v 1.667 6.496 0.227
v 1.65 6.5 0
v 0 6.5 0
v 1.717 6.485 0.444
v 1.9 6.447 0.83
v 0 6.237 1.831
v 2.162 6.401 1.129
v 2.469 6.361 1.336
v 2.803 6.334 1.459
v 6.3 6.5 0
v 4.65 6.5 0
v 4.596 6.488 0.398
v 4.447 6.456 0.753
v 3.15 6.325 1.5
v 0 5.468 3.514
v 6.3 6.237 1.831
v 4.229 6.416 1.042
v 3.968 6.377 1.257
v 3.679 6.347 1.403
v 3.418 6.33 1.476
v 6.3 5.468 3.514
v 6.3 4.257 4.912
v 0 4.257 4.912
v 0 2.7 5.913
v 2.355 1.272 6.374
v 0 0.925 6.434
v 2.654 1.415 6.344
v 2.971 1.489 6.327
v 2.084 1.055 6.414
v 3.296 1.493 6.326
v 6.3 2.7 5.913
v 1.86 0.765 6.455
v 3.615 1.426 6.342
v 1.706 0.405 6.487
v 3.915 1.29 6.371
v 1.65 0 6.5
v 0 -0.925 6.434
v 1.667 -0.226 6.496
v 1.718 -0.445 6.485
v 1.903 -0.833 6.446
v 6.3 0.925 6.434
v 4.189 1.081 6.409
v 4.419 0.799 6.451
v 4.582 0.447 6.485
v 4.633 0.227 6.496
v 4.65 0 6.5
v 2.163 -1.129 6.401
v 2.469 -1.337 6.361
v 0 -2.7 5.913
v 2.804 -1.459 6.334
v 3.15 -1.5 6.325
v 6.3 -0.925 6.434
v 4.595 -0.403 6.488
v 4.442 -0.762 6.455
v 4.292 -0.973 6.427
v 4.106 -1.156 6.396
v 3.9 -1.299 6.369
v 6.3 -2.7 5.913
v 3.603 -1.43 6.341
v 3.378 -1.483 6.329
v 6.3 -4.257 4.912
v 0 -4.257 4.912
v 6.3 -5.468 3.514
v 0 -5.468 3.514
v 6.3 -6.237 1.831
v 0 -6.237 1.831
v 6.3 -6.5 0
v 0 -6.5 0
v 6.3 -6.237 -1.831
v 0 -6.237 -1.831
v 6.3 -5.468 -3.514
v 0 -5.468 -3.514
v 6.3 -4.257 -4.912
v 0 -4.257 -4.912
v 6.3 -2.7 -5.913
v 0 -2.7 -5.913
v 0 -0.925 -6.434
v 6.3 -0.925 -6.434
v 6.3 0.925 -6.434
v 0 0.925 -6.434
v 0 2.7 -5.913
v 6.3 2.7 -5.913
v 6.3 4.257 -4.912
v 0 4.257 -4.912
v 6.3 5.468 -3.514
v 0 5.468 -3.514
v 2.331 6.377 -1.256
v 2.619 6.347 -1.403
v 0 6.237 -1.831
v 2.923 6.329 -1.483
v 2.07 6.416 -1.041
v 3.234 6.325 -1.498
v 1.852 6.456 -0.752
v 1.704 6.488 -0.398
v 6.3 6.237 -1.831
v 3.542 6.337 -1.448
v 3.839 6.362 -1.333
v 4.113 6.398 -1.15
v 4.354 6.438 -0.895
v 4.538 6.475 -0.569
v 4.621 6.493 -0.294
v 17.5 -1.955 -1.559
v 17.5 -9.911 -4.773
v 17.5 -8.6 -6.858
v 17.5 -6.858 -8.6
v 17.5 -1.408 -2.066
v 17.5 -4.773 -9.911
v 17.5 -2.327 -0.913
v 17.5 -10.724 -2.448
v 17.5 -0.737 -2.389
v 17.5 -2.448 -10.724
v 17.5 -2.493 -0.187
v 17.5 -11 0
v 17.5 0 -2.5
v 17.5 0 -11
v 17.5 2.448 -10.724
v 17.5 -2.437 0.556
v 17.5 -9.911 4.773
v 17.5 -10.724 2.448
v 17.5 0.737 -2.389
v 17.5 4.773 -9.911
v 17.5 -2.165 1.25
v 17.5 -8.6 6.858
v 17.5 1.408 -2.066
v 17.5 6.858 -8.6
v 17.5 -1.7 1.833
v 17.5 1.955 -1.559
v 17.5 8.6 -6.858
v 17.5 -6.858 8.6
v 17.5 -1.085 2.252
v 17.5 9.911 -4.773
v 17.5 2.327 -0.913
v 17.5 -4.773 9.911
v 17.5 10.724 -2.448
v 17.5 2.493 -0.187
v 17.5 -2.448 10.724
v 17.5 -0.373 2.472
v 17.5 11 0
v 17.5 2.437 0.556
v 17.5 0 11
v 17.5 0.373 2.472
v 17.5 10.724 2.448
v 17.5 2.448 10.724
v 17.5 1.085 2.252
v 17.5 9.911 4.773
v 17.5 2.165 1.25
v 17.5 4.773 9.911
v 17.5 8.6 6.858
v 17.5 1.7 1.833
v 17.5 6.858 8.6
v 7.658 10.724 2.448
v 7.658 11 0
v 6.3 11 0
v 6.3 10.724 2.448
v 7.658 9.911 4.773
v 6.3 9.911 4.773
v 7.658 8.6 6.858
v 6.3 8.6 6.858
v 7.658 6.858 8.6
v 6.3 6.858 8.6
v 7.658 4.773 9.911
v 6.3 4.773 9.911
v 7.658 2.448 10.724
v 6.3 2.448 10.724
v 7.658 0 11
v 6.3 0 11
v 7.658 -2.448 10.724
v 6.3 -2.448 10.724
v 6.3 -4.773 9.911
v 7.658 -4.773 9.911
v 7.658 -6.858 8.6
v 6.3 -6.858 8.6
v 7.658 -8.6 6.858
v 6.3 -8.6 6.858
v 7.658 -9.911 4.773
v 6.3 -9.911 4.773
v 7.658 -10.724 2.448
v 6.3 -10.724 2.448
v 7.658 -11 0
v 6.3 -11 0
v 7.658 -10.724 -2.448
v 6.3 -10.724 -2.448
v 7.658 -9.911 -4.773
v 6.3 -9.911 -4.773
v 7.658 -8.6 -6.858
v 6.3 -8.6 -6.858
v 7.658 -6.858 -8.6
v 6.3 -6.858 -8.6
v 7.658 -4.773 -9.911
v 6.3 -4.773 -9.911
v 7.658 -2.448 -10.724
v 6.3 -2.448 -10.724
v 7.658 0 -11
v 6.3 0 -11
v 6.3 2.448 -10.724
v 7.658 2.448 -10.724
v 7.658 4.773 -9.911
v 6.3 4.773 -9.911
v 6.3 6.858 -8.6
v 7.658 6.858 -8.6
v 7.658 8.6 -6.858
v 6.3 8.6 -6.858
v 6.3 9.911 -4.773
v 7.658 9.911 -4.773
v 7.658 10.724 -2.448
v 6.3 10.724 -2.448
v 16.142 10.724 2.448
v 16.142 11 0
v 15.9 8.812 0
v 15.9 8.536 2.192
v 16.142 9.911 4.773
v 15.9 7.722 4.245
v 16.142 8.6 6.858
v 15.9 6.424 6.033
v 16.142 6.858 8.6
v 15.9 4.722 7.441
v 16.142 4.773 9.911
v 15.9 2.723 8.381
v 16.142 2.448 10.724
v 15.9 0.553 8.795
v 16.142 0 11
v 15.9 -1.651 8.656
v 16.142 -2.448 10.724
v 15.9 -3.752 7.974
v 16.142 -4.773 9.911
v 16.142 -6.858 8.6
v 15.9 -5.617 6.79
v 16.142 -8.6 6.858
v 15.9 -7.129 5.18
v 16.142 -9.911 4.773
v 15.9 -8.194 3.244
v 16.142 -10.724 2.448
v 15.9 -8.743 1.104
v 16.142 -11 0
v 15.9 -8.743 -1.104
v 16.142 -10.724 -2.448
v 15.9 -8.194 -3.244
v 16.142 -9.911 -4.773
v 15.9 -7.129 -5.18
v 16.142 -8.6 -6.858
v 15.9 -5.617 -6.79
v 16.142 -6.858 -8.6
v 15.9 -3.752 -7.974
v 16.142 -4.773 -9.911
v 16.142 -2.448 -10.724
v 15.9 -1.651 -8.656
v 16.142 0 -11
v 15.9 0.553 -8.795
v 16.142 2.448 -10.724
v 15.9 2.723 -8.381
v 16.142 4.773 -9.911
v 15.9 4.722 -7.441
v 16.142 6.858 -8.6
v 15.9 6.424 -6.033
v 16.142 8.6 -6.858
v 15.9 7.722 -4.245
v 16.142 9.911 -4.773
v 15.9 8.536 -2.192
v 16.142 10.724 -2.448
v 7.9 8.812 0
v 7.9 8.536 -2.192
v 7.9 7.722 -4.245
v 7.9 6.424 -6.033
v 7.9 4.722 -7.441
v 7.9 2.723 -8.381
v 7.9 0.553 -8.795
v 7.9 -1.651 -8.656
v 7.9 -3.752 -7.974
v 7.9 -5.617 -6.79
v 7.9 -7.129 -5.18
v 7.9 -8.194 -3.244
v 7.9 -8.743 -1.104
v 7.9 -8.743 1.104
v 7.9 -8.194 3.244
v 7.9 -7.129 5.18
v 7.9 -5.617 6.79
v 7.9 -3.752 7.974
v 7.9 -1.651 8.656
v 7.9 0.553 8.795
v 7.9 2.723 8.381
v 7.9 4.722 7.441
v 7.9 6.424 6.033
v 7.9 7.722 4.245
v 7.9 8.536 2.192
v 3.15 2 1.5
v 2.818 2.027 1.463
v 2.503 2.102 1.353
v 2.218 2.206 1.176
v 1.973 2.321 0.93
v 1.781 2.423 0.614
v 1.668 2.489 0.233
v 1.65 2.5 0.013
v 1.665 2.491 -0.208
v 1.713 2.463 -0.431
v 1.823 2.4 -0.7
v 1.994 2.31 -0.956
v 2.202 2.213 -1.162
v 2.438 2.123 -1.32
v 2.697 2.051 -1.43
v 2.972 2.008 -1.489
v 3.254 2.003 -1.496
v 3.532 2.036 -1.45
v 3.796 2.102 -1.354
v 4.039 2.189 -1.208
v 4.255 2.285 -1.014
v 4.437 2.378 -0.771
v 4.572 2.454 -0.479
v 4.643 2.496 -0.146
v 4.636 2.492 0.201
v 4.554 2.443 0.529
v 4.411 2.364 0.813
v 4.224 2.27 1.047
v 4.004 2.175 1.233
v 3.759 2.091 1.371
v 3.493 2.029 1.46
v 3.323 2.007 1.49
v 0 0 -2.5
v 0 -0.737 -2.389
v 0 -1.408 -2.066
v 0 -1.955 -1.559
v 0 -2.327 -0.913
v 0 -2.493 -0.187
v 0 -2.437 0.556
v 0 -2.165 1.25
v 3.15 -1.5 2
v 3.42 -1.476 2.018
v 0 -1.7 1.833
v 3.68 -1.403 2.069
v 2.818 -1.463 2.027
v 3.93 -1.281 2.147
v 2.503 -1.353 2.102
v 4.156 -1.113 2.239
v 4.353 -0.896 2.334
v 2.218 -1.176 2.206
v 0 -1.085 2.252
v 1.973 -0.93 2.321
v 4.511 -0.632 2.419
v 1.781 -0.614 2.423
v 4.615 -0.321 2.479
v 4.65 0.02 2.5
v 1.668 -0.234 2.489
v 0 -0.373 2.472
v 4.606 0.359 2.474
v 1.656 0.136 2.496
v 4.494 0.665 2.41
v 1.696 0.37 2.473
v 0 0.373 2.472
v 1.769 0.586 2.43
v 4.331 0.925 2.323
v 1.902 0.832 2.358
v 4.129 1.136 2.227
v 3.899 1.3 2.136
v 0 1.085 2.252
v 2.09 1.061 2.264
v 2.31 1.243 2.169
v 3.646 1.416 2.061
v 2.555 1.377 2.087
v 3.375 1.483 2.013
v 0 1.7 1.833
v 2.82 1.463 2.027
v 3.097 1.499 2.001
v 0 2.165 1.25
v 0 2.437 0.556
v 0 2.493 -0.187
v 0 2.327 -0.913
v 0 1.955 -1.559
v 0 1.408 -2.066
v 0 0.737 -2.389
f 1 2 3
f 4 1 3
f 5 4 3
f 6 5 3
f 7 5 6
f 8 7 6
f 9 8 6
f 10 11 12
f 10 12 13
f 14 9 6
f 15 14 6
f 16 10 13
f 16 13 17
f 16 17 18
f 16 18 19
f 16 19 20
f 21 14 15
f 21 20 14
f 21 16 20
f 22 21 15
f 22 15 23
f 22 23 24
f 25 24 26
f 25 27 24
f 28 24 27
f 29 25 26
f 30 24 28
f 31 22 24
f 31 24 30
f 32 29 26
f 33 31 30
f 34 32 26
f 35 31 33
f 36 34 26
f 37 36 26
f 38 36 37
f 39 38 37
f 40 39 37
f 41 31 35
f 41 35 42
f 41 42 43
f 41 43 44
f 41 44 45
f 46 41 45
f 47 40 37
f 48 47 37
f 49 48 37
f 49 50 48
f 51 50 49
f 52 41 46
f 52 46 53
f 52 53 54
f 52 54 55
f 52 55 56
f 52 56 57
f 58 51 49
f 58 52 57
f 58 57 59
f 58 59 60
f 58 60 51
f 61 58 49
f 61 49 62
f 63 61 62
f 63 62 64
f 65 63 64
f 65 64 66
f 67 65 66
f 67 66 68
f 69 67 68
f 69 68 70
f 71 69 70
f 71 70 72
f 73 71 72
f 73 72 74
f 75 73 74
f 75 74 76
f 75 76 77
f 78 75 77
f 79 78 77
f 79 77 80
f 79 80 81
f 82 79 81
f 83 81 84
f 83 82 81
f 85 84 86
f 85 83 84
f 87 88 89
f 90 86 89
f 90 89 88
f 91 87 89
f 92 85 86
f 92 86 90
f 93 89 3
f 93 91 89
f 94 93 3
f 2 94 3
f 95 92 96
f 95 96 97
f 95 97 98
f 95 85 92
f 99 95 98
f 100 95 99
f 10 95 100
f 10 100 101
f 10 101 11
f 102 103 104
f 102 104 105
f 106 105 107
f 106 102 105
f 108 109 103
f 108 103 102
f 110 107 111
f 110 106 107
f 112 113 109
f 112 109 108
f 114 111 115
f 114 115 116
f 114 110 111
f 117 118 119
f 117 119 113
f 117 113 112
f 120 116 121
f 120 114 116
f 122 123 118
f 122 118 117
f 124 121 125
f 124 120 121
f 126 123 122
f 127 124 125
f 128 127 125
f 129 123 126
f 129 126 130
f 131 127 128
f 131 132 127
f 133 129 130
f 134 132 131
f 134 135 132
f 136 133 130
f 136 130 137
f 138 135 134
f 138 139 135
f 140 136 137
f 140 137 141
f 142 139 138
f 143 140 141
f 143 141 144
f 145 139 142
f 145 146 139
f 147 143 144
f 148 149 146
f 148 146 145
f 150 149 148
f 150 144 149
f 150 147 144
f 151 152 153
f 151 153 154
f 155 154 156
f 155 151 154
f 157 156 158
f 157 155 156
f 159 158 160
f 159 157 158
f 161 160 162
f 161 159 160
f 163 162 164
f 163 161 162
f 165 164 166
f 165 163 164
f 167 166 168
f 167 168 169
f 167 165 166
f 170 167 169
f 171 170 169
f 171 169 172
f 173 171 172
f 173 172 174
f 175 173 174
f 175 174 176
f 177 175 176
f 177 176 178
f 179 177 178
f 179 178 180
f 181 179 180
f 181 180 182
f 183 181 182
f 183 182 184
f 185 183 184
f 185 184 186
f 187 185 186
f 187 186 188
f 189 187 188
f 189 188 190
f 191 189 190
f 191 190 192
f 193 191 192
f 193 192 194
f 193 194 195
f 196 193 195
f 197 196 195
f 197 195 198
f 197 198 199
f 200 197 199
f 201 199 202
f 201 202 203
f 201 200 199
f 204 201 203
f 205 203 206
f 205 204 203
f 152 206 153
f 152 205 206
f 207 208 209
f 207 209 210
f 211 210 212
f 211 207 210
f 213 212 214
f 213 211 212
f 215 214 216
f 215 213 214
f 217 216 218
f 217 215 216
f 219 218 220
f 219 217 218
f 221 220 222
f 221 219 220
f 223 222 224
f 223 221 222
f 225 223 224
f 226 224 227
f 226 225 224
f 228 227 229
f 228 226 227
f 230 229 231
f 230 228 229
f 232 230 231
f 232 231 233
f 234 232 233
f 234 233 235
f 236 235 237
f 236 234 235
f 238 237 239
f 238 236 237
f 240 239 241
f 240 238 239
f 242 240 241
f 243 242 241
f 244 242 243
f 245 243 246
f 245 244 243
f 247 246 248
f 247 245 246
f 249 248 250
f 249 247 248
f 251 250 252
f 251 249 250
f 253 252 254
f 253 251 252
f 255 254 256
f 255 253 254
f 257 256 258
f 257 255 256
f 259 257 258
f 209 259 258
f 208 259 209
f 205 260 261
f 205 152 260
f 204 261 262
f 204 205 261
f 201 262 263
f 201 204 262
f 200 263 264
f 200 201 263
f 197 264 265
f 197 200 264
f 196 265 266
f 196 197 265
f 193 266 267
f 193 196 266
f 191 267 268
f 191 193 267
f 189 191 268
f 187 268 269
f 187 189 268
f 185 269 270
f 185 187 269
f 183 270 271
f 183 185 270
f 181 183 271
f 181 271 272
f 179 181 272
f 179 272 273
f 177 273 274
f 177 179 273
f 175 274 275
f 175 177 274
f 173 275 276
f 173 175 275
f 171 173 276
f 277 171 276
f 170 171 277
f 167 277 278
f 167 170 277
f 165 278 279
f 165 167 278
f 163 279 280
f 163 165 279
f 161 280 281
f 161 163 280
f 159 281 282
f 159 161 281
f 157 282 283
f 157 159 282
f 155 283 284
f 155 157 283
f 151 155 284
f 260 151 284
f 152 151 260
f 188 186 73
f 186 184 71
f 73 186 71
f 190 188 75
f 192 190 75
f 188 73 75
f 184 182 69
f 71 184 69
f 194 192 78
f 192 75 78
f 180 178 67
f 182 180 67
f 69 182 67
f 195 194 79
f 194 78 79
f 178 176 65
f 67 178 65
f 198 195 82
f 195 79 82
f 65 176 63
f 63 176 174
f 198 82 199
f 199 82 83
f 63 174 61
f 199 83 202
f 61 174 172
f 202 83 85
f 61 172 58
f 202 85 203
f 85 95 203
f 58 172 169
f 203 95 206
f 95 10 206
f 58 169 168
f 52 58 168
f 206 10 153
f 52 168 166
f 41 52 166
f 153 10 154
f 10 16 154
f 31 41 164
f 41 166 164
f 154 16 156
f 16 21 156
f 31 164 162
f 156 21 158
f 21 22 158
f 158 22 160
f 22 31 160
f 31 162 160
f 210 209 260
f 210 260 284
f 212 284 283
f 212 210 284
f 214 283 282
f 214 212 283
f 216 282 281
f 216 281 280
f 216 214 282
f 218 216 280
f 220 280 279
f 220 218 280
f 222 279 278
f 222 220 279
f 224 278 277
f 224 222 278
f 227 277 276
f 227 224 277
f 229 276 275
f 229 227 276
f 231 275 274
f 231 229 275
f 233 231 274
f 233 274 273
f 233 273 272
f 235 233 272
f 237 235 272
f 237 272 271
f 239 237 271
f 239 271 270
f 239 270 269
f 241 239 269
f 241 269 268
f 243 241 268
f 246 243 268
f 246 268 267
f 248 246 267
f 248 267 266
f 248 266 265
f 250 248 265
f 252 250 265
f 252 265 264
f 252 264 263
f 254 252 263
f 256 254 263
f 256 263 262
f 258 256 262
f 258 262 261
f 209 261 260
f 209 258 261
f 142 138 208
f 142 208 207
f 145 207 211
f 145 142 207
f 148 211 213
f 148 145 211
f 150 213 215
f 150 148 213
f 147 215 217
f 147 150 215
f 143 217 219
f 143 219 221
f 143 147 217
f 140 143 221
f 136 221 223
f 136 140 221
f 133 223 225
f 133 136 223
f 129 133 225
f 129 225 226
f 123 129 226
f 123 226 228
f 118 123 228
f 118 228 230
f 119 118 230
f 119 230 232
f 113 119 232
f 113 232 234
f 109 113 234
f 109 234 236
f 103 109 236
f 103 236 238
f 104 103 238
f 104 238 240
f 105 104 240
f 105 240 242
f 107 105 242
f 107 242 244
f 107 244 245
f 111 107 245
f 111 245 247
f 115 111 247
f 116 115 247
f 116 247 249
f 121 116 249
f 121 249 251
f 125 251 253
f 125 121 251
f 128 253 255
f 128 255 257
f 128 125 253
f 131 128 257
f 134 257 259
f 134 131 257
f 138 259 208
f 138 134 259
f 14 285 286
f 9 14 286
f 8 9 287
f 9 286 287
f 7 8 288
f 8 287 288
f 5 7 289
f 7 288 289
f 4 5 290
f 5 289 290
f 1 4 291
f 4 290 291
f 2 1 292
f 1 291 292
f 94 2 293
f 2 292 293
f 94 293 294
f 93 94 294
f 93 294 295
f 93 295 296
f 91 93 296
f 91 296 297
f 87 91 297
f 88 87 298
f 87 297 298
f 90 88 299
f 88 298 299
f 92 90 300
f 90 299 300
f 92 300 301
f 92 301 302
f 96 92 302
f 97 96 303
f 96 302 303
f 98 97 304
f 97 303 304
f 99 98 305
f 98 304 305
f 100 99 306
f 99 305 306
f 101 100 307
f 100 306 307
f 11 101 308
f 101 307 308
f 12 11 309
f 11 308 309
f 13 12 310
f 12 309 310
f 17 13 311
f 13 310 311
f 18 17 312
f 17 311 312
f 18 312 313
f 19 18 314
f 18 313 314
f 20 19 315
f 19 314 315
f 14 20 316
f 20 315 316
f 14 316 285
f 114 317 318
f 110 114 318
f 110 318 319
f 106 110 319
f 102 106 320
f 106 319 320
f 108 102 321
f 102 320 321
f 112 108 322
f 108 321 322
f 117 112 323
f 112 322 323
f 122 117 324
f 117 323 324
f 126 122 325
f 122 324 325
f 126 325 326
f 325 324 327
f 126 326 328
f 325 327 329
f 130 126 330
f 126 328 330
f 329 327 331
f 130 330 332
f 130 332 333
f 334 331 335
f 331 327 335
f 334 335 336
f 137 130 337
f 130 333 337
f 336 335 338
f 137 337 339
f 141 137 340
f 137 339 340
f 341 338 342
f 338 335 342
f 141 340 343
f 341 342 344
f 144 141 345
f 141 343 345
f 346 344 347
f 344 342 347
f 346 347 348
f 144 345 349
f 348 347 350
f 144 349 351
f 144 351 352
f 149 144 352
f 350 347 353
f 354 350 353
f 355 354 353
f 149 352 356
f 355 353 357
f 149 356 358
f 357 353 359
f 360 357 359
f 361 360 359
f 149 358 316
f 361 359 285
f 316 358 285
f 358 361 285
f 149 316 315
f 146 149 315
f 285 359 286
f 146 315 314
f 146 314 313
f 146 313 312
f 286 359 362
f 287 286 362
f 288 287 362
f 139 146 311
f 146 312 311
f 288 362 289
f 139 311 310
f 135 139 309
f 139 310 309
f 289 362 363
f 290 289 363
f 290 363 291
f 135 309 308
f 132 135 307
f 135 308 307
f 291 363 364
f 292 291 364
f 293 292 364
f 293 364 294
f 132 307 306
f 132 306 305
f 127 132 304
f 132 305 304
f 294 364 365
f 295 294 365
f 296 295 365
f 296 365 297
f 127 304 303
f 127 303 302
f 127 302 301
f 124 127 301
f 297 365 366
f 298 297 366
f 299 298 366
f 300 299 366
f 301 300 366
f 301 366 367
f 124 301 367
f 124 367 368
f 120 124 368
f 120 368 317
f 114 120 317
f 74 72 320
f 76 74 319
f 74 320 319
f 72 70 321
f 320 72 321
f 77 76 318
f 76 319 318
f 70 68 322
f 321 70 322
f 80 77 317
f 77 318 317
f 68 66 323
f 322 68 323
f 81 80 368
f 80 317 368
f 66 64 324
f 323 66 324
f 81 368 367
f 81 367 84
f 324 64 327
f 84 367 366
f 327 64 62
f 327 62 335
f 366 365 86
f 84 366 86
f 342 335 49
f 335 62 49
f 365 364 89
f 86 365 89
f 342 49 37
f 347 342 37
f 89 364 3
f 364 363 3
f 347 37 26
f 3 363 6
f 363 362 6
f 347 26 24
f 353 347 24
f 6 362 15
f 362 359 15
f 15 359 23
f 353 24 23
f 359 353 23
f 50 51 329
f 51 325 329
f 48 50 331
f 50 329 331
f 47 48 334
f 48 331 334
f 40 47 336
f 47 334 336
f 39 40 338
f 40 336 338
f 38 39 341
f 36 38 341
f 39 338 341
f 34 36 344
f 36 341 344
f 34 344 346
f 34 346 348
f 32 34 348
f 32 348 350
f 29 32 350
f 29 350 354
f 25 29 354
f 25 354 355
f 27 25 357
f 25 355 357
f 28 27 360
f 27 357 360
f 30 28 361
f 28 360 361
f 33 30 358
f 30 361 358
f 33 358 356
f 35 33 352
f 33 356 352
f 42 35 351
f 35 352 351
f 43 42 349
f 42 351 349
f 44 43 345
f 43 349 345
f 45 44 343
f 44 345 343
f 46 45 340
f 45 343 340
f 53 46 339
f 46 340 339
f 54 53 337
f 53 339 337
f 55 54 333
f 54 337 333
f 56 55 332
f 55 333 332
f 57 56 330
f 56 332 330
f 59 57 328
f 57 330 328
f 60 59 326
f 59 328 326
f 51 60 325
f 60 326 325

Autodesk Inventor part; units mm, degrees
ref_plane "YZ Plane" through (0, 0, 0) normal (1, 0, 0) x (0, 1, 0)
ref_plane "XZ Plane" through (0, 0, 0) normal (0, 1, 0) x (-1, 0, 0)
sketch "Sketch1" plane through (0, 0, 0) normal (0, 0, 1) x (1, 0, 0)
  line L0 (0, 0) -> (17.5, 0)
  line L1 (0, 0) -> (0, 6.5)
  line L2 (0, 6.5) -> (6.3, 6.5)
  line L3 (6.3, 6.5) -> (6.3, 11)
  line L4 (6.3, 11) -> (7.658, 11)
  line L5 (7.658, 11) -> (7.9, 8.8125)
  line L6 (7.9, 8.8125) -> (15.9, 8.8125)
  line L7 (15.9, 8.8125) -> (16.142, 11)
  line L8 (16.142, 11) -> (17.5, 11)
  line L9 (17.5, 11) -> (17.5, 0)
  line L10 (7.658, 11) -> (16.142, 11) construction
  line L11 (11.9, 8.8125) -> (11.9, 11) construction
  dimension "d0" = 13
  dimension "d2" = 22
  dimension "d3" = 11.2
  dimension "d4" = 1.358
  dimension "d5" = 8
  dimension "d6" = 1.358
  dimension "d7" = 17.625
  dimension "d8" = 6.3
  dimension "d9" = 17.5
revolve "Revolution1" add sketch "Sketch1" angle 360 about axis through (0, 0, 0) along (1, 0, 0)
sketch "Sketch2" plane through (17.5, 0, 0) normal (1, 0, 0) x (0, 0, -1)
  circle A0 centre (0, 0) radius 11 projected
hole "Hole1" at (17.5, 0, 0) direction (-1, 0, 0) diameter 5 end through all
ref_plane "Work Plane1" through (3.15, 0, 6.5) normal (0, 0, 1) x (1, 0, 0)
sketch "Sketch4" plane through (3.15, 0, 6.5) normal (0, 0, 1) x (1, 0, 0)
  line L0 (3.15, -6.5) -> (3.15, 6.5) projected
  line L1 (-3.15, -6.5) -> (-3.15, 6.5) projected
  line L2 (-3.15, 0) -> (3.15, 0) construction
  point P0 (0, 0)
hole "Hole2" at (3.15, 0, 6.5) direction (0, 0, -1) diameter 3 end up to surface
pattern_circular "Circular Pattern1" count 2 over 90 about axis through (-18.1966, 0, 0) along (-1, 0, 0) of "Hole2"
equation "\"d6\" = d4"
properties part number "GT2 Timing Pulley" material "Aluminum 6061"
